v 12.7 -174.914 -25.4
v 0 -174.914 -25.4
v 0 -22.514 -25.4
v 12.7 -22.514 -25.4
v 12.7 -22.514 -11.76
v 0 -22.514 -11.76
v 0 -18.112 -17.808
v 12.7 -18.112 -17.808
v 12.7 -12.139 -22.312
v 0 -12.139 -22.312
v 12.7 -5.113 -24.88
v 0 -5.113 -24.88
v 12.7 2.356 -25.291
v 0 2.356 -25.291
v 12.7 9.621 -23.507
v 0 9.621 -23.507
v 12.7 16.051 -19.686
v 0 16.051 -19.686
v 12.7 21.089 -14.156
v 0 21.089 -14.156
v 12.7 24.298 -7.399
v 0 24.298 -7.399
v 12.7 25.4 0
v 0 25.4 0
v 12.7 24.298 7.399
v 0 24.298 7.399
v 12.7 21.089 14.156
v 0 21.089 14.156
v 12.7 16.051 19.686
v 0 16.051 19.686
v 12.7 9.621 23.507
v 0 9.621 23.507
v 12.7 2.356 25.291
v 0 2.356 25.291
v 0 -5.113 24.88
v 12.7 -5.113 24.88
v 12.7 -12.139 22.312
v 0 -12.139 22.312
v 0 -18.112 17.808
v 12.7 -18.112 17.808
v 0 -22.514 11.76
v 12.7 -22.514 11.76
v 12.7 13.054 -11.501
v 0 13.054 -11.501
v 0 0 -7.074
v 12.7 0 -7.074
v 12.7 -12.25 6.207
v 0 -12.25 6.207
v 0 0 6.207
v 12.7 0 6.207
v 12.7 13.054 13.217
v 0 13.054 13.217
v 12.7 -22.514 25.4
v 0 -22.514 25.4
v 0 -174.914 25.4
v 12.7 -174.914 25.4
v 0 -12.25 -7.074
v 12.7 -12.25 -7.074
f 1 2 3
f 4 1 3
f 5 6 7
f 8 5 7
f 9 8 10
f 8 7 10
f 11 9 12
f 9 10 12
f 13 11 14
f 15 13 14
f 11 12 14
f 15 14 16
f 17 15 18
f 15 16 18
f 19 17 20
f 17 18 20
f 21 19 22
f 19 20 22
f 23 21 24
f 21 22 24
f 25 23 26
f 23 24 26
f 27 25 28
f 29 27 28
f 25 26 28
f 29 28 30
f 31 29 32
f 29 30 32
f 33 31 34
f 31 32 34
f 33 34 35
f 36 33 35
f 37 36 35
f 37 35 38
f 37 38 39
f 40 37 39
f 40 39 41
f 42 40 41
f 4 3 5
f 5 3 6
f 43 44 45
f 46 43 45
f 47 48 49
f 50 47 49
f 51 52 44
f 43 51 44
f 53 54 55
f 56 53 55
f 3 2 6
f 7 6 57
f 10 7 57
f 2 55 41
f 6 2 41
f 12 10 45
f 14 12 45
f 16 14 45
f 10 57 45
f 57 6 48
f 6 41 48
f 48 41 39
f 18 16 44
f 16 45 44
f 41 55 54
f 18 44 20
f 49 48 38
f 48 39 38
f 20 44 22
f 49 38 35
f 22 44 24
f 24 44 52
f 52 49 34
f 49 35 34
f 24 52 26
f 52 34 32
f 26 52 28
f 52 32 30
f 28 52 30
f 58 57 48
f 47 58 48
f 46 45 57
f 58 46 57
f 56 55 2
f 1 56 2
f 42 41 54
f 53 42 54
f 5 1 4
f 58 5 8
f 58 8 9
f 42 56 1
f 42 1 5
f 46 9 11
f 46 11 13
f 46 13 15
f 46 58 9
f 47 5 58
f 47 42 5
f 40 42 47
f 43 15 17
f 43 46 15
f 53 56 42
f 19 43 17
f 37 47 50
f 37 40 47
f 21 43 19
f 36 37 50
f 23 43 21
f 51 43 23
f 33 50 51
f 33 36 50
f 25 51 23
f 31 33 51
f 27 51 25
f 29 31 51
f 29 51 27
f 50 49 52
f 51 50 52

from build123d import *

# Parameters (mm, degrees)
F1_DEPTH = 12.7


# Not quite as in the source:
# - the program builds the solid bodies; features that only make, move or delete a surface that nothing else refers to are left out


with BuildPart() as f1:
    # F0 (on Right) → F1 (new body)
    with BuildSketch(Plane.YZ):
        with BuildLine():
            Line((-22.5137730746, 11.7596777994), (-22.5137730746, 25.4))
            Line((-22.5137730746, 25.4), (-174.9137730746, 25.4))
            Line((-174.9137730746, 25.4), (-174.9137730746, -25.4))
            Line((-174.9137730746, -25.4), (-22.5137730746, -25.4))
            Line((-22.5137730746, -25.4), (-22.5137730746, -11.7596777994))
            ThreePointArc((-22.5137730746, -11.7596777994), (25.4, 0), (-22.5137730746, 11.7596777994))
        make_face()
        Polygon((-12.2498031706, -7.0739961229), (-12.2498031706, 6.2070912682), (0, 6.2070912682), (13.0541240796, 13.2165625691), (13.0541240796, -11.5010300651), (0, -7.0739961229), align=None, mode=Mode.SUBTRACT)
    extrude(amount=F1_DEPTH)


solid = f1.part
